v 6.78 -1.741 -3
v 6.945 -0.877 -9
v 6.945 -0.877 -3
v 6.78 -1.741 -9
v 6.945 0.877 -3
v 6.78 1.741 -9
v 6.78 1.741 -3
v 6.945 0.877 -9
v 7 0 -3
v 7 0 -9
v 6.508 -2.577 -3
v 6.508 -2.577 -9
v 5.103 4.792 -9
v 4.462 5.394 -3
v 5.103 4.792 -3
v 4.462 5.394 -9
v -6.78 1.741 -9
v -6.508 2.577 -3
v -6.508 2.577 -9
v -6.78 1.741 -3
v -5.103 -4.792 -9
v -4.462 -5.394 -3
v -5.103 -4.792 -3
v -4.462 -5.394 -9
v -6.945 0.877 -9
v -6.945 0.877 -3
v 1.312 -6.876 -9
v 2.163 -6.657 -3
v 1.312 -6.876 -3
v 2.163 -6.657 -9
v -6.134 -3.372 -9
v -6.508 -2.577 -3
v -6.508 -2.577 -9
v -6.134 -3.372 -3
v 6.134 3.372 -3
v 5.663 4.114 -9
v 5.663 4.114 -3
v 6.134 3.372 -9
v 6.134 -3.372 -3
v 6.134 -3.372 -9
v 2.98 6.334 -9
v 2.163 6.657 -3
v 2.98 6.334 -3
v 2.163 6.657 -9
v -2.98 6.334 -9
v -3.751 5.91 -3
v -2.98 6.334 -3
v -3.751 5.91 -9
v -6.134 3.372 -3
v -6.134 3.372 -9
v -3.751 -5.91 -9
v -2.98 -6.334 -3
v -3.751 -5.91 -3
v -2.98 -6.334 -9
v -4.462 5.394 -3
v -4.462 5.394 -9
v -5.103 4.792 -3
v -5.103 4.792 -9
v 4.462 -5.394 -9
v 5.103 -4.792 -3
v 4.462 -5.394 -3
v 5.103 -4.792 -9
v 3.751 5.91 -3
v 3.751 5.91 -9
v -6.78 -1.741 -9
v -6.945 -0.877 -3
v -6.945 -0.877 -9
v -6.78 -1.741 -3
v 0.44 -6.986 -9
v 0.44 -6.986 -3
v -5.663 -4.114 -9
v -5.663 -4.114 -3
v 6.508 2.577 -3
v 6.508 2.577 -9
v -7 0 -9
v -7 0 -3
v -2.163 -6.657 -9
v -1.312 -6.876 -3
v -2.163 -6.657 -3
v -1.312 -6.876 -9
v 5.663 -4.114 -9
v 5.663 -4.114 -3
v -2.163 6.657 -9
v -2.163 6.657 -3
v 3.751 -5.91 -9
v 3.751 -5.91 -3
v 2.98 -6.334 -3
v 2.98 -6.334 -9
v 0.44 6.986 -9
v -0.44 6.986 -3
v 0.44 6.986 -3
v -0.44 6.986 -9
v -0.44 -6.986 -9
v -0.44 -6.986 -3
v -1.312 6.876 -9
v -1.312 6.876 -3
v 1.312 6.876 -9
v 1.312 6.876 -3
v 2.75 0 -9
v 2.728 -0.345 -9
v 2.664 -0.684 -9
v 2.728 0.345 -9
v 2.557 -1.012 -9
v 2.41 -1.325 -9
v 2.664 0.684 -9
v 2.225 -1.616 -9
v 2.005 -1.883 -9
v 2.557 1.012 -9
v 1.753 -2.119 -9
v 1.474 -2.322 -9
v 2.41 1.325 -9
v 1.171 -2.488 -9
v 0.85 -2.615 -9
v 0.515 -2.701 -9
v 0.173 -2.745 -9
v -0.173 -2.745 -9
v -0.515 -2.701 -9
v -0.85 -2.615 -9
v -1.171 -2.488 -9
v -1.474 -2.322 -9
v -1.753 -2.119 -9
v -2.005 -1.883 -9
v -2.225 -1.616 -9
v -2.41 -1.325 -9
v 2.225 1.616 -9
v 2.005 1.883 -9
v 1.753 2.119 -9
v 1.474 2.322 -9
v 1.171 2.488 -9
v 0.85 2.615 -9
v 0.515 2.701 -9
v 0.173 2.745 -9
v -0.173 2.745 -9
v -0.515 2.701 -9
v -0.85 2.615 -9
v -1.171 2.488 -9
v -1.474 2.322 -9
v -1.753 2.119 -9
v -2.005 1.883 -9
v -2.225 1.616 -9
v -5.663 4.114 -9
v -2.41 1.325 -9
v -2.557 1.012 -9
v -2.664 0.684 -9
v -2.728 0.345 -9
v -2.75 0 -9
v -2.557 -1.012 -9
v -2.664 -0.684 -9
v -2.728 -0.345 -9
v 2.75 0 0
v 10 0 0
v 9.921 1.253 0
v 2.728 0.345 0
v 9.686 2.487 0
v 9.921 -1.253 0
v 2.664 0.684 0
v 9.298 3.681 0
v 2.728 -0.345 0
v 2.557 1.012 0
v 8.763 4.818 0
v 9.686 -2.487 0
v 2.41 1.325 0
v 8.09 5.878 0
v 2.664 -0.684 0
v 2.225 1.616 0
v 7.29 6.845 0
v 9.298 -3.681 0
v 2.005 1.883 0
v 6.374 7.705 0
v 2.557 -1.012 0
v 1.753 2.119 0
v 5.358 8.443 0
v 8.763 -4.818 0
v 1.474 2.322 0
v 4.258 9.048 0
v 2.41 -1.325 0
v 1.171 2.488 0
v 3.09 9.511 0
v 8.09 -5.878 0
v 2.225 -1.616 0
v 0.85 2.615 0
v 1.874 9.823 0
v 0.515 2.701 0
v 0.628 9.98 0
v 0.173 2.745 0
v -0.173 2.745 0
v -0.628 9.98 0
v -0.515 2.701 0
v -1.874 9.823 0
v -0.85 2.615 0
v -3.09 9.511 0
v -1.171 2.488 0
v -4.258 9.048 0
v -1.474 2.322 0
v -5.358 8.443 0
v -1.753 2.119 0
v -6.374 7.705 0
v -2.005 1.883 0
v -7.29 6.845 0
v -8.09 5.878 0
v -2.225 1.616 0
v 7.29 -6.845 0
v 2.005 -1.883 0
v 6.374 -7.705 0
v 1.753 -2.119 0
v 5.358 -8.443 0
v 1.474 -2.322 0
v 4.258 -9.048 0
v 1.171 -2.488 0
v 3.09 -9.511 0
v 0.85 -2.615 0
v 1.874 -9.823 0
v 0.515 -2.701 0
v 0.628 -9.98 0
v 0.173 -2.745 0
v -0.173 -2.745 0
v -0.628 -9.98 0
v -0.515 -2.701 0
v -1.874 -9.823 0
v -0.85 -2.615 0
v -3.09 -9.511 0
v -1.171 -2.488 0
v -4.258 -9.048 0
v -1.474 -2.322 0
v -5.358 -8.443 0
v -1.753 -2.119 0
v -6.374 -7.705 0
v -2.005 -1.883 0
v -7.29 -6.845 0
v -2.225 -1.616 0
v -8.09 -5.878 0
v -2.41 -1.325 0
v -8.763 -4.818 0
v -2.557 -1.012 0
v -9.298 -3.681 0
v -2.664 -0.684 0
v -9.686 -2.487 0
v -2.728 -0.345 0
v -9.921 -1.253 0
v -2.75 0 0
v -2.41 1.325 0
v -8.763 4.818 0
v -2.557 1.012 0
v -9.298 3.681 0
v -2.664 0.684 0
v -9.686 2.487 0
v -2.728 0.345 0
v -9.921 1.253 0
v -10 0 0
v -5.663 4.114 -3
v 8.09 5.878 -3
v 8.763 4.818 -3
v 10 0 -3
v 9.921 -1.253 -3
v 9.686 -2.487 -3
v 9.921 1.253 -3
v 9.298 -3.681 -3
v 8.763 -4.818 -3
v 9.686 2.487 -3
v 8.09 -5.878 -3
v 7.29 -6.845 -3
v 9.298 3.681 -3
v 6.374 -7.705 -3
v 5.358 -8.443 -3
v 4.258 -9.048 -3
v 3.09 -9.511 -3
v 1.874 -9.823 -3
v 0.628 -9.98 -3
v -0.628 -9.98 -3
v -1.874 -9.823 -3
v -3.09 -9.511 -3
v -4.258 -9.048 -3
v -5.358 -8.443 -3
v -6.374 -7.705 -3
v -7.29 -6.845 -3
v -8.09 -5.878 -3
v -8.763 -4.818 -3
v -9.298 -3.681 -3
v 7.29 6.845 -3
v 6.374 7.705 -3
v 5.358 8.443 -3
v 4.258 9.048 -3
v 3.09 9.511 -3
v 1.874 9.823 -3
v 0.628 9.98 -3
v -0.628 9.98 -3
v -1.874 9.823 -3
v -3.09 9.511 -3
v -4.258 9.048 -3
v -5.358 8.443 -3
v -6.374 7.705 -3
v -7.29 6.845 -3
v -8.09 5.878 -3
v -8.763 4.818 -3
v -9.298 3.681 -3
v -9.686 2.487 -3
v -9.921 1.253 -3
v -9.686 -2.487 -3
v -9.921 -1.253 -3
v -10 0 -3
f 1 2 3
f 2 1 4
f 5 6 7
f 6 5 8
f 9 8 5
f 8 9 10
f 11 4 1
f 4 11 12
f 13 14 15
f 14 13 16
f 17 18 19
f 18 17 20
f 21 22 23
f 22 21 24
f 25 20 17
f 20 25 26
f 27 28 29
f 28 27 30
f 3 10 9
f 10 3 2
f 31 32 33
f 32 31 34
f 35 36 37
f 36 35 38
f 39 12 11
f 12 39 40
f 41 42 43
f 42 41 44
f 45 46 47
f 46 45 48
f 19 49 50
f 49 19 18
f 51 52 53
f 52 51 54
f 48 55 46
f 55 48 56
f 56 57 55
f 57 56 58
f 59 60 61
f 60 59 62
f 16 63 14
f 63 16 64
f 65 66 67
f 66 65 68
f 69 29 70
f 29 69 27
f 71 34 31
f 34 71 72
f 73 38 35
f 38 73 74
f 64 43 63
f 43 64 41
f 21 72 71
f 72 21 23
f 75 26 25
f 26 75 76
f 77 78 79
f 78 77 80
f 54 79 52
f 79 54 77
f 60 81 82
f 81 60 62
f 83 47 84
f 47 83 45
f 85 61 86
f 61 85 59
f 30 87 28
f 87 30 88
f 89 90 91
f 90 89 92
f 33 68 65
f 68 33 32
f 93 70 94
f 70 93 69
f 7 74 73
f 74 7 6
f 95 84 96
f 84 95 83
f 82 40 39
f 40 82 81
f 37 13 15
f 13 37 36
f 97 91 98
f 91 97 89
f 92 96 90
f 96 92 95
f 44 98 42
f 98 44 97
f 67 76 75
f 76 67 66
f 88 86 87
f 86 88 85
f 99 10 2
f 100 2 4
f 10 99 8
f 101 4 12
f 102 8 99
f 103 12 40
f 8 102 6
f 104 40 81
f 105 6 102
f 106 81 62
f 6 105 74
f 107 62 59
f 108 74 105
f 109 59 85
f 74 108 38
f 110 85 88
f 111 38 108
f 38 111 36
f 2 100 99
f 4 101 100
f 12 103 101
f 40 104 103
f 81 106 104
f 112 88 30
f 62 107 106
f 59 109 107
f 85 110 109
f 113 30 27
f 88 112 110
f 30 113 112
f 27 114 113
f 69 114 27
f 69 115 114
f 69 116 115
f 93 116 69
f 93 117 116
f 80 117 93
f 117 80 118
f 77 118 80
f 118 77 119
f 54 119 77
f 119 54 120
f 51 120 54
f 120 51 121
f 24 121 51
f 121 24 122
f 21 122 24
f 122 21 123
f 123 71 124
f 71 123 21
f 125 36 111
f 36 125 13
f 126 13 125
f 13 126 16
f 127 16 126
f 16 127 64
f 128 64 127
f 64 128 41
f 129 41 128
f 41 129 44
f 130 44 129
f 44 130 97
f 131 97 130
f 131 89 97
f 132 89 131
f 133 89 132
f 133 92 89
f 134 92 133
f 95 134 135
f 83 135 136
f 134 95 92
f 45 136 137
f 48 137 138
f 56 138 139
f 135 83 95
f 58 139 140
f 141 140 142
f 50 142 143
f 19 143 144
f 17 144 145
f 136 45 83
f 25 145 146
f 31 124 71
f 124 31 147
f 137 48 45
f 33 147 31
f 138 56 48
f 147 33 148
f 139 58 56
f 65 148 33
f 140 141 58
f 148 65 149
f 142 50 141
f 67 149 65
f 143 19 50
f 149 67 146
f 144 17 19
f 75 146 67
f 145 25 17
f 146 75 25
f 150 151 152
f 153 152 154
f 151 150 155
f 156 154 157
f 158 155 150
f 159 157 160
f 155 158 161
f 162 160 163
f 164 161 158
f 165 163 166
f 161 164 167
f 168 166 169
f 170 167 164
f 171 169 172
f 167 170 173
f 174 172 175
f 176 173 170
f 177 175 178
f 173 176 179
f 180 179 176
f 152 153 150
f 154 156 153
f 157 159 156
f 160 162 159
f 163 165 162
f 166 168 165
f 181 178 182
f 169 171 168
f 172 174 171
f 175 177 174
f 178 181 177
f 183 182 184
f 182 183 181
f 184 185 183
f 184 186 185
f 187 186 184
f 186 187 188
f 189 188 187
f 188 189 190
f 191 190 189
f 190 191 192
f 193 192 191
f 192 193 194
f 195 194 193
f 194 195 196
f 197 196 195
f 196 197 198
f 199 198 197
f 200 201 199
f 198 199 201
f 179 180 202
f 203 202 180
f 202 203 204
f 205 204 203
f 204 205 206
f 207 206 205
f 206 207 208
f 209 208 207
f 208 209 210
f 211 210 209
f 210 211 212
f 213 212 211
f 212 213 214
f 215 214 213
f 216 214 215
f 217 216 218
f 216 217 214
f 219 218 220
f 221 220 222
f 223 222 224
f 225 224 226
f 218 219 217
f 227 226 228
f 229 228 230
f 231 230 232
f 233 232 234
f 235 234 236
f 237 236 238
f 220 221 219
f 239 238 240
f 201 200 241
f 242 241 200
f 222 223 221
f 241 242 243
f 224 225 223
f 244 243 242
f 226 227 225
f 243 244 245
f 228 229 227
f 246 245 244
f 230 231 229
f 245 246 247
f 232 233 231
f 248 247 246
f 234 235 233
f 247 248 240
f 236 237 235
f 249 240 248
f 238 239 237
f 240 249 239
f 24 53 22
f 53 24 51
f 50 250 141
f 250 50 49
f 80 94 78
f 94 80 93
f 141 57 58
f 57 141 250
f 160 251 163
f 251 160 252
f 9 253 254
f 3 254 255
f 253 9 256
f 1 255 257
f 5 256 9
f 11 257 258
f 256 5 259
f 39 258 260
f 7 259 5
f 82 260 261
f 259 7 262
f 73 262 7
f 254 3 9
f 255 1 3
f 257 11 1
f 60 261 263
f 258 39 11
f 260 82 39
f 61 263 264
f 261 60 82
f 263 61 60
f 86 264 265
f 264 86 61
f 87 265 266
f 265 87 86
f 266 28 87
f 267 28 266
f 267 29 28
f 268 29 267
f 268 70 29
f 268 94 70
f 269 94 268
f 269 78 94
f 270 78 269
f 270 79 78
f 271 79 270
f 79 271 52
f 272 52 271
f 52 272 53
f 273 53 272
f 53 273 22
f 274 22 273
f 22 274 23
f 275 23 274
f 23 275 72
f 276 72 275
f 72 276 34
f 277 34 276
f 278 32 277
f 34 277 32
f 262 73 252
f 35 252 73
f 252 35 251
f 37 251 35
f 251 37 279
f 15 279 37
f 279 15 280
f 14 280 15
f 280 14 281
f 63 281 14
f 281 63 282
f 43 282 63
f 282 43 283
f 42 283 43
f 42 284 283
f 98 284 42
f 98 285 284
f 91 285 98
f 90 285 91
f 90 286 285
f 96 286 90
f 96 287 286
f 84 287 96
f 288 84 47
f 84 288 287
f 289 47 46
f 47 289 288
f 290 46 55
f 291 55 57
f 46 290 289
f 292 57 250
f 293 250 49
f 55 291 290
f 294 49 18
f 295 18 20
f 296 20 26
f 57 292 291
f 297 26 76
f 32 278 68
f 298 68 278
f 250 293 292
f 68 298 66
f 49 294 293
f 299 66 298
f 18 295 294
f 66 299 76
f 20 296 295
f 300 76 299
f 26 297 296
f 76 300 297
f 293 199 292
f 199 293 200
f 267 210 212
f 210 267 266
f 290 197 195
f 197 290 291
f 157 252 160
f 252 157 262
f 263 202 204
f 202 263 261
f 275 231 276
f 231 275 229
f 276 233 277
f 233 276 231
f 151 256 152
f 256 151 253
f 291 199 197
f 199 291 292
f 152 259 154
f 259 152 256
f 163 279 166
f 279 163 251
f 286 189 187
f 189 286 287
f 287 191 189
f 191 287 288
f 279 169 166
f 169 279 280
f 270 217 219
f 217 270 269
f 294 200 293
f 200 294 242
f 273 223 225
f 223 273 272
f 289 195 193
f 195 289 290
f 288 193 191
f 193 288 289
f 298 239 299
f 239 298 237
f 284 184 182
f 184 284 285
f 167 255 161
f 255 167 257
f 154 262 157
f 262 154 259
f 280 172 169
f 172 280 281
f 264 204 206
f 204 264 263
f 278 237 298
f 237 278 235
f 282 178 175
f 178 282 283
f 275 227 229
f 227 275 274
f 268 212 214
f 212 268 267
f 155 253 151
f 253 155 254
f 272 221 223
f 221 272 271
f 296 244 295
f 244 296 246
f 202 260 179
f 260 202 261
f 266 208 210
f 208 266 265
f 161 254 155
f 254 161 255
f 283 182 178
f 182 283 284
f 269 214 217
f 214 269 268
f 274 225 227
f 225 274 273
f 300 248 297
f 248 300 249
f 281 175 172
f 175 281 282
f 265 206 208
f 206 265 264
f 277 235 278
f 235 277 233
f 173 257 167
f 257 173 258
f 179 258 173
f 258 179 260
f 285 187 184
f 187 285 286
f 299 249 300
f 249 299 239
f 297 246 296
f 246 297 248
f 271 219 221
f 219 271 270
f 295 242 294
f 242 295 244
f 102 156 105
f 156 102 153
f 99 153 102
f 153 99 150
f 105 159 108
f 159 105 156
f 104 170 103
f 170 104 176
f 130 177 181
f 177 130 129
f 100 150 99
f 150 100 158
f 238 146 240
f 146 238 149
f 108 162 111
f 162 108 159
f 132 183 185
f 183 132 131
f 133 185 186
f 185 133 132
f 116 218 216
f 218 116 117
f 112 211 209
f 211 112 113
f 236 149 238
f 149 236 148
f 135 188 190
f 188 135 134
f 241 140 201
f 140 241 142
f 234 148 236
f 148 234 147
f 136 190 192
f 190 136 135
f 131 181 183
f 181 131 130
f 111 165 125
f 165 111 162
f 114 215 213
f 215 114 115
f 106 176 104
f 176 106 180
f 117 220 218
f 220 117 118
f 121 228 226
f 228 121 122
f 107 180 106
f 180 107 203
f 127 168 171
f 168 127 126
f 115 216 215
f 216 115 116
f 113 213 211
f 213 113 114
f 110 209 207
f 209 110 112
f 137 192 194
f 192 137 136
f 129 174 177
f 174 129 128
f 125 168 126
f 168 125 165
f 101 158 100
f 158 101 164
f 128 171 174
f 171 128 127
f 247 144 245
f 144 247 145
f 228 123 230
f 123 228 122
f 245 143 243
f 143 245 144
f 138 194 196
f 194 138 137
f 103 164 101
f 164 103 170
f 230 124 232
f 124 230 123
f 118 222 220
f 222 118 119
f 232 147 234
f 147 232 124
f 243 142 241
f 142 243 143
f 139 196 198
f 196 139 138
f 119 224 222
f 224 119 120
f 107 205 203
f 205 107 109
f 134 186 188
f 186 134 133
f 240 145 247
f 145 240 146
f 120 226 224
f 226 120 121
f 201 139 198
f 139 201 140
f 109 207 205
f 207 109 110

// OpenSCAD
$fn = 50;


difference() {
	union() {
		translate(v = [0, 0, -9.0000000000]) {
			cylinder(h = 9, r = 7.0000000000);
		}
		translate(v = [0, 0, -3.0000000000]) {
			cylinder(h = 3, r = 10.0000000000);
		}
	}
	union() {
		#translate(v = [0, 0, -9]) {
			cylinder(h = 9, r = 2.7500000000);
		}
	}
}
